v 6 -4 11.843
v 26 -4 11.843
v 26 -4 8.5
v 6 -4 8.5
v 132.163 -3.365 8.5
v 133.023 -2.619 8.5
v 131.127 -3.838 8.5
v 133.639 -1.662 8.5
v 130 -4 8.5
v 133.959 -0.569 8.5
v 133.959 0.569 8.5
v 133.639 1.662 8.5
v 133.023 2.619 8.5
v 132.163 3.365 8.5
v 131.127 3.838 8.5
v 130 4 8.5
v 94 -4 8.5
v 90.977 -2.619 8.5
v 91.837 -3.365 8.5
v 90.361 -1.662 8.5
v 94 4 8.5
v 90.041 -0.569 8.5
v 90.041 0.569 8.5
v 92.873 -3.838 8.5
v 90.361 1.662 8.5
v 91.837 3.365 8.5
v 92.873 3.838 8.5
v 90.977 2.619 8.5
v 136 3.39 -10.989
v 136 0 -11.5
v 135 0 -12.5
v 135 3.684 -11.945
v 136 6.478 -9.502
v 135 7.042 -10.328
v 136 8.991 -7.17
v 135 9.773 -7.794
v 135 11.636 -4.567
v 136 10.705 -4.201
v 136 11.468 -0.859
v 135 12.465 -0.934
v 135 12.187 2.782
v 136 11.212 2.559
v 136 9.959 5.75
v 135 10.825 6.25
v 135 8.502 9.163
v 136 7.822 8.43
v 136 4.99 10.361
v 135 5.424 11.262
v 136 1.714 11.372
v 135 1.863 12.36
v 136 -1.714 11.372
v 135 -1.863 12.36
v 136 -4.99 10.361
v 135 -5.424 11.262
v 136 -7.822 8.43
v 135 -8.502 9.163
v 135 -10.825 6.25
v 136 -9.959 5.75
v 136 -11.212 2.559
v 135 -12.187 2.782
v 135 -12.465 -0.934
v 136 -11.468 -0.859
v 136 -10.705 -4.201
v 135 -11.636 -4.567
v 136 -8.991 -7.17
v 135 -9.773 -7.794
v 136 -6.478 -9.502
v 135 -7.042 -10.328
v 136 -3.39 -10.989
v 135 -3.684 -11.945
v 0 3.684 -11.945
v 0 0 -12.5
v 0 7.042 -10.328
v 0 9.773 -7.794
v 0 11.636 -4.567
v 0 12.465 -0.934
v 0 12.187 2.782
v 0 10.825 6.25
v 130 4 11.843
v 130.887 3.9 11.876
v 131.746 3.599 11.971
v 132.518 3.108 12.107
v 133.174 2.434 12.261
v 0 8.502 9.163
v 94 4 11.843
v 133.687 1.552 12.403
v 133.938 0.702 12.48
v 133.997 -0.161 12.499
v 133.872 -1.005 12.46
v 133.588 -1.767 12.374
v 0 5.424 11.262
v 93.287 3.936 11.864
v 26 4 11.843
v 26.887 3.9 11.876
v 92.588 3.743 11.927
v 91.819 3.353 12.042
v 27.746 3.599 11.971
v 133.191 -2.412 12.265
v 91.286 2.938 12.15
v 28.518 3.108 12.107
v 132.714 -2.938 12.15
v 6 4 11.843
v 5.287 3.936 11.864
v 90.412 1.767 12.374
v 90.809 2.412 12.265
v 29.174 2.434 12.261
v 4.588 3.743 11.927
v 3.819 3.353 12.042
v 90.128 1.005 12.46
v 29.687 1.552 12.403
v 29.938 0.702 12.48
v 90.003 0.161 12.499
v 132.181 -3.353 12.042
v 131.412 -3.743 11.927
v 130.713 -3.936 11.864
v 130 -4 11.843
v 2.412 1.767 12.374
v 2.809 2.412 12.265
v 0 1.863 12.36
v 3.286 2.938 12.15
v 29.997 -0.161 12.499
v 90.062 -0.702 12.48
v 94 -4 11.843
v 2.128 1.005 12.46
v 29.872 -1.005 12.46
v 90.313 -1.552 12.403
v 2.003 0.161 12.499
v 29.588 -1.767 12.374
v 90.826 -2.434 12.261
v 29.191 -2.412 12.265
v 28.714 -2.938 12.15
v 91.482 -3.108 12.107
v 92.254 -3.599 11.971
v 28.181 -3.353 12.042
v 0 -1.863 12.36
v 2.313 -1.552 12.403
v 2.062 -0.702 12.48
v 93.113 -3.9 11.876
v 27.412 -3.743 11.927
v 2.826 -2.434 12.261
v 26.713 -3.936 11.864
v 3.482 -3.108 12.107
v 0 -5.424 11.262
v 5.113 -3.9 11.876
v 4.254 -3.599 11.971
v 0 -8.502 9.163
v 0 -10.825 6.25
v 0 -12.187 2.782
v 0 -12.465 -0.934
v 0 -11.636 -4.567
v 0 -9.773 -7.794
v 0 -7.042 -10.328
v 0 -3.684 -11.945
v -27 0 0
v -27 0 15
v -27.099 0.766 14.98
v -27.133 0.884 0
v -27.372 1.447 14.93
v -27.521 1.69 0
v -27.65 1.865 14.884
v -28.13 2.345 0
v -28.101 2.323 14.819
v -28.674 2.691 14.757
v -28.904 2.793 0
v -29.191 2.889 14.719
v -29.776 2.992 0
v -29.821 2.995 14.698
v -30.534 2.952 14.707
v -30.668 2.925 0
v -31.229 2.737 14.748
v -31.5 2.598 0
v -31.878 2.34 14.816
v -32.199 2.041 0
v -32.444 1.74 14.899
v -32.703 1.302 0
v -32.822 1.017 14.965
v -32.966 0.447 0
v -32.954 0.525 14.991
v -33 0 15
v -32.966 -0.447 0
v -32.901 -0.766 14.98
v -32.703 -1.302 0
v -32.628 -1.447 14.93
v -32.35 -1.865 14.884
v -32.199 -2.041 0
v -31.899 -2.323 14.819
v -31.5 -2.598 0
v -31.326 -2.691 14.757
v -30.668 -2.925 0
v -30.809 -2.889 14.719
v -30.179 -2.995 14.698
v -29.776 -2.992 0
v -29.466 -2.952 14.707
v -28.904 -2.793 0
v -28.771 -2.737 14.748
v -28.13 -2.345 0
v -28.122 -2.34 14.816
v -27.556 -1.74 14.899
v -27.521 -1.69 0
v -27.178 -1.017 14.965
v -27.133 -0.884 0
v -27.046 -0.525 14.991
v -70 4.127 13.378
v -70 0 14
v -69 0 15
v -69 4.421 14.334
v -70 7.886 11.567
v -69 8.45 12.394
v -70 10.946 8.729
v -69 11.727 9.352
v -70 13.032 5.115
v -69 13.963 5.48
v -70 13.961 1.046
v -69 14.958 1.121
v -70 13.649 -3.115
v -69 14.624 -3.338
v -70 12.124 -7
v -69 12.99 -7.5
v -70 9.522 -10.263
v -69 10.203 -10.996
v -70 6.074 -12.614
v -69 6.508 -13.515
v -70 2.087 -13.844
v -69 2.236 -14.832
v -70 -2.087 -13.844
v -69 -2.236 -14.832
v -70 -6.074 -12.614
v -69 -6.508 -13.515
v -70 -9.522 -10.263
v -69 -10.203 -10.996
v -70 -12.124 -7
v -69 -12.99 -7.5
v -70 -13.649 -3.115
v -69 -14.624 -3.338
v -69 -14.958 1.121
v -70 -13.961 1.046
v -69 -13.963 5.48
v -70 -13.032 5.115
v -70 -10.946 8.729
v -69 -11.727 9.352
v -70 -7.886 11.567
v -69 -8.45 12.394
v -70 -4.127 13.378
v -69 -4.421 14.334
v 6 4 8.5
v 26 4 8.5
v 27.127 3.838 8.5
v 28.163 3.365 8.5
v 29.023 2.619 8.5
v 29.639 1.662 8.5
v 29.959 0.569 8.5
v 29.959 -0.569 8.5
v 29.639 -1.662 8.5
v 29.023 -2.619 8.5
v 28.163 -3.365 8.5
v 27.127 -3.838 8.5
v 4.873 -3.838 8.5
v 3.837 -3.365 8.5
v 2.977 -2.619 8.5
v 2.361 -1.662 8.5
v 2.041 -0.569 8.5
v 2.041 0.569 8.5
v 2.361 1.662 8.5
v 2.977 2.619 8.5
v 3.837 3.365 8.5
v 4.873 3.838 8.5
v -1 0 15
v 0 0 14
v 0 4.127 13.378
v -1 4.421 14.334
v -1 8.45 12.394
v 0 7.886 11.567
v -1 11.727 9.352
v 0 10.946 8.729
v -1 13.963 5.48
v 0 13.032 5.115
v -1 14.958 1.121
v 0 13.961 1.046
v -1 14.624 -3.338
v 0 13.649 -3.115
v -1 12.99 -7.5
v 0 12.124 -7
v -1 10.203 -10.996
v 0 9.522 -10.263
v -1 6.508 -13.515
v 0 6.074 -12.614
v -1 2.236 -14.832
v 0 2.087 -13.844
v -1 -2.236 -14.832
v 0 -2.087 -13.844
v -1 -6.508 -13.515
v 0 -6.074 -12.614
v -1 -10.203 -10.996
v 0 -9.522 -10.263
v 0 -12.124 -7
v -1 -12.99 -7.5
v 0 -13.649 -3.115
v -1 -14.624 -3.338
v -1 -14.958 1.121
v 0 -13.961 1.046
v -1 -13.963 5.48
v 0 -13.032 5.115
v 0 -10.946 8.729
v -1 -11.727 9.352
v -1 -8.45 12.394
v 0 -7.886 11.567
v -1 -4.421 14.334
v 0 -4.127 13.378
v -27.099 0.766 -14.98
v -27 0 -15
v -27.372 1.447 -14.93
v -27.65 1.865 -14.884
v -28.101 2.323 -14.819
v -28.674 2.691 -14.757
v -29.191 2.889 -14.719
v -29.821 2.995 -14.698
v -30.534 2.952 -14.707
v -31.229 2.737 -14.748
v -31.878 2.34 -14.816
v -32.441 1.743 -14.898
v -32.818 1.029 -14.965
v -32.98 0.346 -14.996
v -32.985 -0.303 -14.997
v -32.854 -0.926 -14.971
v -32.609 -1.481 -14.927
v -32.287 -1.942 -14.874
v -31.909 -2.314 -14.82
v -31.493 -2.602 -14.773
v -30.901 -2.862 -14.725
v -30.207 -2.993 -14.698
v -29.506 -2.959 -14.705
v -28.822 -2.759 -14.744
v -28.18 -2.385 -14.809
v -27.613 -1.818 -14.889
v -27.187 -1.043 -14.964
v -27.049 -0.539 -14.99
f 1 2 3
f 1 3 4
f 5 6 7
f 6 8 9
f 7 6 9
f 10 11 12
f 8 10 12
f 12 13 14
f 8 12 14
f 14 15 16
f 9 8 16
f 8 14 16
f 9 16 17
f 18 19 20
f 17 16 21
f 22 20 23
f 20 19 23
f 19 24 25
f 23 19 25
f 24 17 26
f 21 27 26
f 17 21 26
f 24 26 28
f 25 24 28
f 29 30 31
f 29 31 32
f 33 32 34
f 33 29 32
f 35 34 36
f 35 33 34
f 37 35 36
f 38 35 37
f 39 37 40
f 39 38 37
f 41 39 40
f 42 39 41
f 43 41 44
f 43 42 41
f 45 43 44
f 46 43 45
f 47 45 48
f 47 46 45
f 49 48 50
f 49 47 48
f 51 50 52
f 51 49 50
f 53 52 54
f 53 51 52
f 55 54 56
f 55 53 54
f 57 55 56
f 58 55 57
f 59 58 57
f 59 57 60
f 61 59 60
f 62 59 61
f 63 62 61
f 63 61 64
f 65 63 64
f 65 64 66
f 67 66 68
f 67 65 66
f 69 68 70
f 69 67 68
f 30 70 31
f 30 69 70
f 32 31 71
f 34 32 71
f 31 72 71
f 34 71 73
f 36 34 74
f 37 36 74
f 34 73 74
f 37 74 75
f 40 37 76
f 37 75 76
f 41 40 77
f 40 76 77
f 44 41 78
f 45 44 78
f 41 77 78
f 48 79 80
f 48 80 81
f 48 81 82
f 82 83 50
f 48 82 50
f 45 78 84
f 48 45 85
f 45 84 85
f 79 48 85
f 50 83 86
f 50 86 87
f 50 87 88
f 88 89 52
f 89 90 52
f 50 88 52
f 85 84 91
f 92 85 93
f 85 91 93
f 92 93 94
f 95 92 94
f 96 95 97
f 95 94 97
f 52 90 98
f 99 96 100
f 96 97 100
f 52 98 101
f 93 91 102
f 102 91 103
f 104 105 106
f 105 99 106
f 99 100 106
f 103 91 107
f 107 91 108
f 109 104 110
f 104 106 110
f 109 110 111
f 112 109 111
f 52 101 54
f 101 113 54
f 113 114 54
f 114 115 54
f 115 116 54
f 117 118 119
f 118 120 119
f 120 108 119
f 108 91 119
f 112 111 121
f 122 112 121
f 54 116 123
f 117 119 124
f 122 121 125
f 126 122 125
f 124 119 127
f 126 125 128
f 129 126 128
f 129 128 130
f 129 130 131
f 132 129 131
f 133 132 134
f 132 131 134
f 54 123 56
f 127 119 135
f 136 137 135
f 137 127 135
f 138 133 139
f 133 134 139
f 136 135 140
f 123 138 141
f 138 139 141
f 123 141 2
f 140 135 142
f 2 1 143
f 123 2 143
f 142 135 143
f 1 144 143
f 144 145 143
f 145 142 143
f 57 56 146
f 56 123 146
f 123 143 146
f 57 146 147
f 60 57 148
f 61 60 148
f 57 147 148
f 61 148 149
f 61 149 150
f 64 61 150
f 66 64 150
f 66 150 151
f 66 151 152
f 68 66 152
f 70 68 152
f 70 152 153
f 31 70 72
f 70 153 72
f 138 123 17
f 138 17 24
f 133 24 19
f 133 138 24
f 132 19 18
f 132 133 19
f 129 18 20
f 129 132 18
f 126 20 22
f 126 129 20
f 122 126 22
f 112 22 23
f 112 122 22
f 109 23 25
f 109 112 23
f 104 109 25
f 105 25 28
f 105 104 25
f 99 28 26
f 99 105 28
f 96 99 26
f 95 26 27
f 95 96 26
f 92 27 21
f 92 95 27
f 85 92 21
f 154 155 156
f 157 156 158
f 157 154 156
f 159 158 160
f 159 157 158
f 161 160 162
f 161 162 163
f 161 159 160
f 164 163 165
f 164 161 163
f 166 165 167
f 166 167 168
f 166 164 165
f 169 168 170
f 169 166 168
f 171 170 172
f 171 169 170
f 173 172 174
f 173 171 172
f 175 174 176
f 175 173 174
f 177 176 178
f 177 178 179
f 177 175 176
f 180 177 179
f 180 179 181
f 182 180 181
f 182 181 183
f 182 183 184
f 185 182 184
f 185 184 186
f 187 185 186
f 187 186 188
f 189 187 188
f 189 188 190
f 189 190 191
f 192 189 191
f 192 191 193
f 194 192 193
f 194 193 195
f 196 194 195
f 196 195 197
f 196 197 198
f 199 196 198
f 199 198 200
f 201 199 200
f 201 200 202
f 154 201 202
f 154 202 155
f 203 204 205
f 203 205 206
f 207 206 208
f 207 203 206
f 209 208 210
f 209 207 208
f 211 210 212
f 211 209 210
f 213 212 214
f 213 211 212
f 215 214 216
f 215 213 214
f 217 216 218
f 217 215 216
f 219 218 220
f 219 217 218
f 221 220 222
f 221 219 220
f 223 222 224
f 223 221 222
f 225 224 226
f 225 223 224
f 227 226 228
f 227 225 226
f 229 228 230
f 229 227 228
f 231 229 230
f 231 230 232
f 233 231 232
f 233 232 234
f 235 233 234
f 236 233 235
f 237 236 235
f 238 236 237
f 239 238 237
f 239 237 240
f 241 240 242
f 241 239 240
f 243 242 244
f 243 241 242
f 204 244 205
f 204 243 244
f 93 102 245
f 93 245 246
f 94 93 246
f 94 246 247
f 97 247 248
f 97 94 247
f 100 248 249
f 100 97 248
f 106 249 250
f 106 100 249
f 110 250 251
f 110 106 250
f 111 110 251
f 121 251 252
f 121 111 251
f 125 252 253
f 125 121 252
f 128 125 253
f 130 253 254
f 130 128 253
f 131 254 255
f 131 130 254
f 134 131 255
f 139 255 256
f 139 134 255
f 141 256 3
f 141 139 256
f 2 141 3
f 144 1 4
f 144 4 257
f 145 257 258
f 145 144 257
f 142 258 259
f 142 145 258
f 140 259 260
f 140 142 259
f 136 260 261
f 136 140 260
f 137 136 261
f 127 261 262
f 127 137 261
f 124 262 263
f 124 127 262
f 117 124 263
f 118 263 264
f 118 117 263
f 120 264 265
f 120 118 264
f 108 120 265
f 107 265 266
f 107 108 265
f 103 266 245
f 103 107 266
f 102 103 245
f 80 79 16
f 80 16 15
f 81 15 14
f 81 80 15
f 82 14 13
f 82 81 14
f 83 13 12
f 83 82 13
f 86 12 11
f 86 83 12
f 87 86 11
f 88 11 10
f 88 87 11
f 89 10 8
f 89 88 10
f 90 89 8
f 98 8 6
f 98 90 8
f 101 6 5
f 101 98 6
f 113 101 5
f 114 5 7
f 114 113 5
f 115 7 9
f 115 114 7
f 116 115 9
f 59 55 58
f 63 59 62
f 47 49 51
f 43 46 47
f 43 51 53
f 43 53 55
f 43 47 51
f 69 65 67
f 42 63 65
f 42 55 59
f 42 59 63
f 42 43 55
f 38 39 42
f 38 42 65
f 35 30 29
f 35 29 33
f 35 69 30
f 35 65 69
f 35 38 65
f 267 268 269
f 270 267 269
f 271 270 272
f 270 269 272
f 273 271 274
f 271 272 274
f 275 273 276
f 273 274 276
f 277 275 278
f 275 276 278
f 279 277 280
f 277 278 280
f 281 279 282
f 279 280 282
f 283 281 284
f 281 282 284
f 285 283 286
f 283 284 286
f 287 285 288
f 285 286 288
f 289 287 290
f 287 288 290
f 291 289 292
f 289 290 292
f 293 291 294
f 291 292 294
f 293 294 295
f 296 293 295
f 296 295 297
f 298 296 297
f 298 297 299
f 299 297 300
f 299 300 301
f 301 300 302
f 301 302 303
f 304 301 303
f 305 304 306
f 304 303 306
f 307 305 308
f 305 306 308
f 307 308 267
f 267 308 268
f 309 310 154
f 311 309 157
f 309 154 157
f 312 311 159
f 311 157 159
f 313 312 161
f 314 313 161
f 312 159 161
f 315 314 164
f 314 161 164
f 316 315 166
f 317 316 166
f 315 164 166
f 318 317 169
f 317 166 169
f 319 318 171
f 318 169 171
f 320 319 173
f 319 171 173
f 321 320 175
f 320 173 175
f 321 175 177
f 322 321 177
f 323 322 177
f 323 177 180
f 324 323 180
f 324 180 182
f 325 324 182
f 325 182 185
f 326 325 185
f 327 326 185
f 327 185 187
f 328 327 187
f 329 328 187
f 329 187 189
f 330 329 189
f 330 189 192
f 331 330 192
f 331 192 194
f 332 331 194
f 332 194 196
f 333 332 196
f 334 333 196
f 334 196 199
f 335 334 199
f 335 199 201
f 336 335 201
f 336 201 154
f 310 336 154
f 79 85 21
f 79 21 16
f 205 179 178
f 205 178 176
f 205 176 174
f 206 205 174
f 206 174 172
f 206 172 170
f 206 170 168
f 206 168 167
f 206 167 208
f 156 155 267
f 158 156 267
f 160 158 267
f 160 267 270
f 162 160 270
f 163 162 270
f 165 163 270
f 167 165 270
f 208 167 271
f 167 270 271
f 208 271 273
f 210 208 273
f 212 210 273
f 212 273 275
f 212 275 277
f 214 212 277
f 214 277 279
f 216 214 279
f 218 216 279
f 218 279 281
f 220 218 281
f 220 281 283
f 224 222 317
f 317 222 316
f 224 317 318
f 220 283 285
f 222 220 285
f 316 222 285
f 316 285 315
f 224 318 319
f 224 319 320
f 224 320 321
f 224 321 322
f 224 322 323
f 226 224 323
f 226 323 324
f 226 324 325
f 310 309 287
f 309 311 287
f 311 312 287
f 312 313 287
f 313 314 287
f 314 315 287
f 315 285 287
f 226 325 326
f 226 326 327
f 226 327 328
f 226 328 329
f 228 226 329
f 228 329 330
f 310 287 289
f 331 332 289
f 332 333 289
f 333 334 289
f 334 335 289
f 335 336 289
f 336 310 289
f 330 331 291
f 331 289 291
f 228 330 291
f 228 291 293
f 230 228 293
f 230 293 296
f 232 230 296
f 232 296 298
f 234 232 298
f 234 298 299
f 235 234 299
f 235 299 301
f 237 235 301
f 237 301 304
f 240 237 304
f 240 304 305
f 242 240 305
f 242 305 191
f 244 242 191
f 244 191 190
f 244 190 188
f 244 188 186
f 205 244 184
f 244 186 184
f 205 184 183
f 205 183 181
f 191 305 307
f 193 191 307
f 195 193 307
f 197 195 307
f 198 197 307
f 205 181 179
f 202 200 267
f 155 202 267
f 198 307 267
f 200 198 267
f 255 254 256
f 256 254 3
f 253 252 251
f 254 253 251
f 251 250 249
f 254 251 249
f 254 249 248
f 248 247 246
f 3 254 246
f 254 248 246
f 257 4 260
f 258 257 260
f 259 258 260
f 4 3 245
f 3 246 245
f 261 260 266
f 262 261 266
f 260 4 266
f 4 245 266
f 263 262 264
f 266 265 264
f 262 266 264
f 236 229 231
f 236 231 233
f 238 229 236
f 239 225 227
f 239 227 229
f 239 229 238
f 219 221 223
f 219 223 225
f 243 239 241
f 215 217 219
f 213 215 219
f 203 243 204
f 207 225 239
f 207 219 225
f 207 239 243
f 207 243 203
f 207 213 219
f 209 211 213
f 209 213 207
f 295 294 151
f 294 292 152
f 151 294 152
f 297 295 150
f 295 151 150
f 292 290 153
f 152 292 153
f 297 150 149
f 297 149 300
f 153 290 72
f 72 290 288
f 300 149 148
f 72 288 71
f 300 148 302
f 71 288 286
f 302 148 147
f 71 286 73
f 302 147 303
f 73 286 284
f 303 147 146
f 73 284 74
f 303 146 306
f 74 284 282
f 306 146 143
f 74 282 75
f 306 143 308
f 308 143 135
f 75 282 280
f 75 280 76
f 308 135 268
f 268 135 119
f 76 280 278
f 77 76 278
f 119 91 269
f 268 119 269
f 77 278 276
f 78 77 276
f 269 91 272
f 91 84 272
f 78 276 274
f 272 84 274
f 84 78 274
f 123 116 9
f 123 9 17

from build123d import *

# Parameters (mm, degrees)
SKETCH_1_R               = 12.5
EXTRUDE_1_DEPTH          = 136
SKETCH_2_R               = 15
EXTRUDE_2_DEPTH          = 70
CHAMFER_1_SIZE           = 1
CUT_EXTRUDE_1_DEPTH      = 4
SKETCH_4_R               = 3
CUT_EXTRUDE_2_DEPTH      = 16
CUT_EXTRUDE_2_DEPTH_BACK = 16


with BuildPart() as part:
    # 草图1 → 凸台-拉伸1 (new body)
    with BuildSketch(Plane(origin=(0, 0, 0), x_dir=(0, 0, -1), z_dir=(1, 0, 0))):
        Circle(SKETCH_1_R)
    extrude(amount=EXTRUDE_1_DEPTH)

    # 草图2 → 凸台-拉伸2 (add)
    with BuildSketch(Plane.ZY):
        Circle(SKETCH_2_R)
    extrude(amount=EXTRUDE_2_DEPTH)

    # 倒角1
    chamfer_1_edges = [part.edges().sort_by_distance(p)[0] for p in [
        (136, 0, 12.5),
        (0, 0, -15),
        (-70, 0, -15),
    ]]
    chamfer(chamfer_1_edges, length=CHAMFER_1_SIZE)

    # 草图3 → 切除-拉伸1 (cut)
    with BuildSketch(Plane.XY.offset(12.5)):
        with BuildLine():
            Line((6, 4), (26, 4))
            ThreePointArc((26, 4), (30, 0), (26, -4))
            Line((26, -4), (6, -4))
            ThreePointArc((6, -4), (2, 0), (6, 4))
        make_face()
        with BuildLine():
            Line((94, 4), (130, 4))
            ThreePointArc((130, 4), (134, 0), (130, -4))
            Line((130, -4), (94, -4))
            ThreePointArc((94, -4), (90, 0), (94, 4))
        make_face()
    extrude(amount=-CUT_EXTRUDE_1_DEPTH, mode=Mode.SUBTRACT)

    # 草图4 → 切除-拉伸2 (cut, two sides)
    with BuildSketch(Plane.XY) as cut_extrude_2_sk:
        with Locations((-30, 0)):
            Circle(SKETCH_4_R)
    extrude(amount=CUT_EXTRUDE_2_DEPTH, mode=Mode.SUBTRACT)
    extrude(cut_extrude_2_sk.sketch, amount=-CUT_EXTRUDE_2_DEPTH_BACK, mode=Mode.SUBTRACT)


solid = part.part
